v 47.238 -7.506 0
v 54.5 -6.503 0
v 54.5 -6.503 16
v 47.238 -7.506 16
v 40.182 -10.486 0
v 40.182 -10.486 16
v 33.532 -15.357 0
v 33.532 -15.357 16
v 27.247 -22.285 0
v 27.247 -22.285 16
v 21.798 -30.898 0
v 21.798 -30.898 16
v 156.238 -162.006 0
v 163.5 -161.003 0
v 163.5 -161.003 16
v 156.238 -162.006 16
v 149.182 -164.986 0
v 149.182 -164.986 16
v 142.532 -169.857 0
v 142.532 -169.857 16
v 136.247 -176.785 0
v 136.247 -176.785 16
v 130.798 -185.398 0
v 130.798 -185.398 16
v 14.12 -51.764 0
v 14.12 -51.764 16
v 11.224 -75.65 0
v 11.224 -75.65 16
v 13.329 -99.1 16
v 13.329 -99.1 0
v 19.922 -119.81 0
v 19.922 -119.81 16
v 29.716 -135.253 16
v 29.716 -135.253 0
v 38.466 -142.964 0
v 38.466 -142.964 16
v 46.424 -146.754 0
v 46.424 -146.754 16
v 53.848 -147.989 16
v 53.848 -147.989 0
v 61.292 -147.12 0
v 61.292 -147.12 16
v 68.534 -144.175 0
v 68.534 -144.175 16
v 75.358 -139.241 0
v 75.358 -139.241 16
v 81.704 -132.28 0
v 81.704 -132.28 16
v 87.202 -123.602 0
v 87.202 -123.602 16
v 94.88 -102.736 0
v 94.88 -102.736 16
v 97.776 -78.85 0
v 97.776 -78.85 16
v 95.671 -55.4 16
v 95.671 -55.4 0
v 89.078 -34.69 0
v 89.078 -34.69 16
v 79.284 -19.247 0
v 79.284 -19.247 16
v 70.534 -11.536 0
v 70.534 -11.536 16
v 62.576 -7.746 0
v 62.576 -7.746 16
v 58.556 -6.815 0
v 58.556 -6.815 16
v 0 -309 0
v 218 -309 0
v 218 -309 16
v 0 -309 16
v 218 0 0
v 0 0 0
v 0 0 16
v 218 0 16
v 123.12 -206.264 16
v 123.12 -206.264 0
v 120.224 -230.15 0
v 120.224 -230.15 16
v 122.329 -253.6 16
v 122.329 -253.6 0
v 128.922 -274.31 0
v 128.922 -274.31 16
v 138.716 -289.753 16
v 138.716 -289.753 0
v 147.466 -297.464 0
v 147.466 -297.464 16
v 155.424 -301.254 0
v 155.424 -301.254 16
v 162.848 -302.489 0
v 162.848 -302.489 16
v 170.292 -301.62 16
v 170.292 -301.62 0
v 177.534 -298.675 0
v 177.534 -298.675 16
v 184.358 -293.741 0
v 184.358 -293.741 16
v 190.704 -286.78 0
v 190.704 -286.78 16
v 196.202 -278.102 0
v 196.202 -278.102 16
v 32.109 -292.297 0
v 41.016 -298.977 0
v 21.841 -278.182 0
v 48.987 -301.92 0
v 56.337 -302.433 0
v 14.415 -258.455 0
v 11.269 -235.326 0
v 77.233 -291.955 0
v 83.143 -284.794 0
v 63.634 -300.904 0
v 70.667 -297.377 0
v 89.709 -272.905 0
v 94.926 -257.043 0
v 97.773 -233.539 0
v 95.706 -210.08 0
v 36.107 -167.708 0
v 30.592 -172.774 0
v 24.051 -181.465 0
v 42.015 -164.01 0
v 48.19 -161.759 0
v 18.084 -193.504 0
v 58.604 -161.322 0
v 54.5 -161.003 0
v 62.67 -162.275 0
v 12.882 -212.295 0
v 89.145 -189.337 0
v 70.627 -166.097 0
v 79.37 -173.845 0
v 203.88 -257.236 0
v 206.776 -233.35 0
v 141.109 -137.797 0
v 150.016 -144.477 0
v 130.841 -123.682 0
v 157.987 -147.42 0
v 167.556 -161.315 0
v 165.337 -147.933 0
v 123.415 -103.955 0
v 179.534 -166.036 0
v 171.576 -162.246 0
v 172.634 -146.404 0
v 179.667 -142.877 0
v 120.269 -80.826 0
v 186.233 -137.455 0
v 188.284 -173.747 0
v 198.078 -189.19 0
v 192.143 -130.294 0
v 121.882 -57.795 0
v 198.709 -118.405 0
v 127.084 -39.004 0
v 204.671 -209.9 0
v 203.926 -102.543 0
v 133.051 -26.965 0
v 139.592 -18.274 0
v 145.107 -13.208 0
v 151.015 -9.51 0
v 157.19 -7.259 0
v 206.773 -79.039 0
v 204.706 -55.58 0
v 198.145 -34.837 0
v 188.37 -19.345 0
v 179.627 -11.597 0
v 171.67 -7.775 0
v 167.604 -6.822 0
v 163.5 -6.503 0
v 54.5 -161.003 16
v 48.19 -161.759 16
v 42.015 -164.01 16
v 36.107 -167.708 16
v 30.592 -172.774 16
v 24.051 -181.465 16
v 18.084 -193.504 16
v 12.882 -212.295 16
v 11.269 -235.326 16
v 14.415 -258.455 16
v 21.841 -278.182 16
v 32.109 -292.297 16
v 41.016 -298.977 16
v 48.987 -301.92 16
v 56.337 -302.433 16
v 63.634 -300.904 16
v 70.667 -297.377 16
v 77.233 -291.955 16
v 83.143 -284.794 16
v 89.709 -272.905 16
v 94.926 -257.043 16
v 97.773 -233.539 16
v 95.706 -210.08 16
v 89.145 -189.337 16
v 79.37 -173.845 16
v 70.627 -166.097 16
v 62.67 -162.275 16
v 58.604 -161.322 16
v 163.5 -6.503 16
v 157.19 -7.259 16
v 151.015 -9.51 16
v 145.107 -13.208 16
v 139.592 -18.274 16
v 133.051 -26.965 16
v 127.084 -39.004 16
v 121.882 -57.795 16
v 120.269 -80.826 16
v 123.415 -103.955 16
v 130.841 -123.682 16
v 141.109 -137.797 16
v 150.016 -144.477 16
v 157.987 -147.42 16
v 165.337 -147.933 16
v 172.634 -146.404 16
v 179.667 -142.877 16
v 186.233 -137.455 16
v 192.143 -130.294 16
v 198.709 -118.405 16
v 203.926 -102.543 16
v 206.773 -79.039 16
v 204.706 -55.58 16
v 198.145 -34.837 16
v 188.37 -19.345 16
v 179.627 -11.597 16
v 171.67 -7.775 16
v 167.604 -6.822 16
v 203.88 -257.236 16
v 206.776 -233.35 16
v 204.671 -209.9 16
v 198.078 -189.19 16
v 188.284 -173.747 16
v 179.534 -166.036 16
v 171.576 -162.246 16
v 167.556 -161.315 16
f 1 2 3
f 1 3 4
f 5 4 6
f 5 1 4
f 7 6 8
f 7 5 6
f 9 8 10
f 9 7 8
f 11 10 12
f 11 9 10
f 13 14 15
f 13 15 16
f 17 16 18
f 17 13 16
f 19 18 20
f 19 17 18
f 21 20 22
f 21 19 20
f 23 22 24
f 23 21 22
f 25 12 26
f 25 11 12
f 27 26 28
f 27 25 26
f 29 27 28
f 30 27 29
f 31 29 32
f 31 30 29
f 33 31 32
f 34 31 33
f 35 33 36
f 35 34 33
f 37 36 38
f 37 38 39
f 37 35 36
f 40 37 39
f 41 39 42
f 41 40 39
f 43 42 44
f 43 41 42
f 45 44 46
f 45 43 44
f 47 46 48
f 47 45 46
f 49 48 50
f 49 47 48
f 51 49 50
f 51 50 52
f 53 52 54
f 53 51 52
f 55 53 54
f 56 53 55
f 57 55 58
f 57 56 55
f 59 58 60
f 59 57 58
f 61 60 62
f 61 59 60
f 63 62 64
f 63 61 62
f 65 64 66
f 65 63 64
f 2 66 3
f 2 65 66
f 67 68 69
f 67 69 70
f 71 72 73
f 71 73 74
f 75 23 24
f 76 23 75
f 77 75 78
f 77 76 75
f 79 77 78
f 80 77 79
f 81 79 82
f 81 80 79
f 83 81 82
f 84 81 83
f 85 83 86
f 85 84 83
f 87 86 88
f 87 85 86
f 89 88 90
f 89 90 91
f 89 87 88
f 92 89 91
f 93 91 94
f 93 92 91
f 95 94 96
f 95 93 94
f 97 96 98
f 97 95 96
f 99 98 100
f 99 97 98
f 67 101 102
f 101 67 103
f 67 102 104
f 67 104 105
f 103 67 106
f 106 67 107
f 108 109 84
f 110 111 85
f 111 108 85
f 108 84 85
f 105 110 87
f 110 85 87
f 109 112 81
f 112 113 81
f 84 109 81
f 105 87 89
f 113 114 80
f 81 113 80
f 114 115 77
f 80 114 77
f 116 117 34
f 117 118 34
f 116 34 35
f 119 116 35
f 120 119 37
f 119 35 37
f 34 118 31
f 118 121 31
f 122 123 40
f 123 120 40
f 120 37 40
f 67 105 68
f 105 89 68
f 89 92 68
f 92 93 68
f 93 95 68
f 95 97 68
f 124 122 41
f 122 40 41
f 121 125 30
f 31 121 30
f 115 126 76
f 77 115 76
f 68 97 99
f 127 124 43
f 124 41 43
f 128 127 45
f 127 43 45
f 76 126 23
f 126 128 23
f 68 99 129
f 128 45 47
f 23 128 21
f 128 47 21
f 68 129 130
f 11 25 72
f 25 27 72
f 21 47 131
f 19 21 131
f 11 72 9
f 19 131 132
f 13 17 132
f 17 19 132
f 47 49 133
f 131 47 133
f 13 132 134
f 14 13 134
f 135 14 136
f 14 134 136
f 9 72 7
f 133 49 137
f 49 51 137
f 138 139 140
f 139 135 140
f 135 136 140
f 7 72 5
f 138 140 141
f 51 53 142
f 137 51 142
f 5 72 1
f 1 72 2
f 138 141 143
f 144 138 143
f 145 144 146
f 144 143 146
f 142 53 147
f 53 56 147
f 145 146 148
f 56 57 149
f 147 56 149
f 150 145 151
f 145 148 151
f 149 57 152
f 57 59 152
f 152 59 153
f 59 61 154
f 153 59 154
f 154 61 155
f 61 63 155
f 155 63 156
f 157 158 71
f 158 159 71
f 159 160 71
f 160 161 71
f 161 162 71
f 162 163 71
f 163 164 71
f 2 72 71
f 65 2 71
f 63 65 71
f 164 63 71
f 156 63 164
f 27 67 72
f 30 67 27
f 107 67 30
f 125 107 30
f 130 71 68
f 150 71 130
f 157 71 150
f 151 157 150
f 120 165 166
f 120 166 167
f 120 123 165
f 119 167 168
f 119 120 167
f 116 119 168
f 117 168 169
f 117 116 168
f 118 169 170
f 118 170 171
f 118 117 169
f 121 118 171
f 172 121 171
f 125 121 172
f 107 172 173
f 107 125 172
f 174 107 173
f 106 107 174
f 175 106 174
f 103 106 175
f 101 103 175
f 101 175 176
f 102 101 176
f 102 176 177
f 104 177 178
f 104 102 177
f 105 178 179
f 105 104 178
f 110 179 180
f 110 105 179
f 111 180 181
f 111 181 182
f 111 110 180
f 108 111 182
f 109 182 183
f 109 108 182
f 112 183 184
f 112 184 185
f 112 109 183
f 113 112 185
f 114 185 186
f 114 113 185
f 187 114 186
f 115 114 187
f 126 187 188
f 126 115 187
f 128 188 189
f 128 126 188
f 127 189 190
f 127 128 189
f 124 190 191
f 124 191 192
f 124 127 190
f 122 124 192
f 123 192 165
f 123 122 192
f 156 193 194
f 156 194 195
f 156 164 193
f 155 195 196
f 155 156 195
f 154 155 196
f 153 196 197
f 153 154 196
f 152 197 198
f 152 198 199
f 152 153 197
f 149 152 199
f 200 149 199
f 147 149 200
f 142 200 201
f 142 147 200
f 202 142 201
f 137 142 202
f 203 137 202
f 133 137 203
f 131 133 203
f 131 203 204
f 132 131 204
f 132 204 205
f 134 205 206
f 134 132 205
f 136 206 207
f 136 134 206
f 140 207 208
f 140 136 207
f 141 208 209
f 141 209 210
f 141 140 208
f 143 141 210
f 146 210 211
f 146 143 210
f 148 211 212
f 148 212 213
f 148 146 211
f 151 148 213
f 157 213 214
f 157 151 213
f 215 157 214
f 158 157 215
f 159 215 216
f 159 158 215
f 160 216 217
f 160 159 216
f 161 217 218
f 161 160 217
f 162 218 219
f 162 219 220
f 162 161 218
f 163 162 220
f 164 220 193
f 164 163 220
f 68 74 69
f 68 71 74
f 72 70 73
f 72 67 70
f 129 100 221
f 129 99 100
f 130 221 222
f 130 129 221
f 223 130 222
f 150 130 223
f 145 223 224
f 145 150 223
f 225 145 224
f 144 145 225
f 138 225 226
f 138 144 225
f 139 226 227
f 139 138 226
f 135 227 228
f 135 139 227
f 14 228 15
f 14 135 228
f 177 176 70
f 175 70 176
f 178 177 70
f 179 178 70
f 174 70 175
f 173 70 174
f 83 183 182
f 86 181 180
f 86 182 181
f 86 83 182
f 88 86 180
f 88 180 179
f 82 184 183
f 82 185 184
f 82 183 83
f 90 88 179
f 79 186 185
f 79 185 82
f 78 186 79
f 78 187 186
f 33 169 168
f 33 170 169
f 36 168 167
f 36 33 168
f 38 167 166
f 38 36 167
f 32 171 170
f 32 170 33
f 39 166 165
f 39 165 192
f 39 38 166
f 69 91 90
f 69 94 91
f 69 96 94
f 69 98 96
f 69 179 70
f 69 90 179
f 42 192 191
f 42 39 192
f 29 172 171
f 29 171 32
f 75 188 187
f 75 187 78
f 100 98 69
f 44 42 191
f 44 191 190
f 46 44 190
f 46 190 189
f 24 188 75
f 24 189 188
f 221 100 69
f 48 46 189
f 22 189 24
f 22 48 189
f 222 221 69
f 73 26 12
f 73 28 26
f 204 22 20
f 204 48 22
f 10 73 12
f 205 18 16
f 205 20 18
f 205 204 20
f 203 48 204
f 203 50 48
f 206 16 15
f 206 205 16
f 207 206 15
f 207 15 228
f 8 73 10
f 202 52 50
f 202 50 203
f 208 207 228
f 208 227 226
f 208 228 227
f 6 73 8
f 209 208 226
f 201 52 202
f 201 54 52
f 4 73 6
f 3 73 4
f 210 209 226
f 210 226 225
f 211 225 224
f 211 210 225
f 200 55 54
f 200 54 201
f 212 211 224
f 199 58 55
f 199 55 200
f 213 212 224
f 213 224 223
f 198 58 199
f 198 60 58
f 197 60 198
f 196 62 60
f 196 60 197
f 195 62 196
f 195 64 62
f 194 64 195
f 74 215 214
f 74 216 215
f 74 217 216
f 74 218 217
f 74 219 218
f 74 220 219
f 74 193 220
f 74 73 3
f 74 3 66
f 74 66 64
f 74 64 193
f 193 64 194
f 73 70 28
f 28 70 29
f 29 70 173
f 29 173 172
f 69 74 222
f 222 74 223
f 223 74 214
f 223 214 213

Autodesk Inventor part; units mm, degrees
ref_plane "YZ Plane" through (0, 0, 0) normal (1, 0, 0) x (0, 1, 0)
ref_plane "XZ Plane" through (0, 0, 0) normal (0, 1, 0) x (-1, 0, 0)
ref_plane "XY Plane" through (0, 0, 0) normal (0, 0, 1) x (1, 0, 0)
sketch "Эскиз1" plane through (0, 0, 0) normal (0, 0, 1) x (1, 0, 0)
  line L0 (0, 0) -> (218, 0)
  line L1 (218, 0) -> (218, -309)
  line L2 (218, -309) -> (0, -309)
  line L3 (0, -309) -> (0, 0)
  line L4 (0, 0) -> (218, -309)
  line L5 (218, 0) -> (0, -309) construction
  line L6 (0, -154.5) -> (218, -154.5) construction
  line L7 (109, 0) -> (109, -309) construction
  line L8 (109, 0) -> (0, -154.5) construction
  line L9 (0, -154.5) -> (109, -309) construction
  line L10 (109, -309) -> (218, -154.5) construction
  line L11 (218, -154.5) -> (109, 0) construction
  ellipse E0 centre (163.5, -231.75) end of major axis (163.5, -161.0034) minor radius 43.2868
  ellipse E1 centre (54.5, -231.75) end of major axis (54.5, -161.0034) minor radius 43.2868
  ellipse E2 centre (163.5, -77.25) end of major axis (163.5, -6.5034) minor radius 43.2868
  ellipse E3 centre (54.5, -77.25) end of major axis (54.5, -6.5034) minor radius 43.2868
  dimension "d0" = 218
  dimension "d1" = 309
extrude "Выдавливание2" add sketch "Эскиз1" along normal blind 16 contours L4 E3 E0 L2 L3 | L0 L1 L4 E0 E3
properties part number "ArmDesk" material "Древесно-стружечная плита"
